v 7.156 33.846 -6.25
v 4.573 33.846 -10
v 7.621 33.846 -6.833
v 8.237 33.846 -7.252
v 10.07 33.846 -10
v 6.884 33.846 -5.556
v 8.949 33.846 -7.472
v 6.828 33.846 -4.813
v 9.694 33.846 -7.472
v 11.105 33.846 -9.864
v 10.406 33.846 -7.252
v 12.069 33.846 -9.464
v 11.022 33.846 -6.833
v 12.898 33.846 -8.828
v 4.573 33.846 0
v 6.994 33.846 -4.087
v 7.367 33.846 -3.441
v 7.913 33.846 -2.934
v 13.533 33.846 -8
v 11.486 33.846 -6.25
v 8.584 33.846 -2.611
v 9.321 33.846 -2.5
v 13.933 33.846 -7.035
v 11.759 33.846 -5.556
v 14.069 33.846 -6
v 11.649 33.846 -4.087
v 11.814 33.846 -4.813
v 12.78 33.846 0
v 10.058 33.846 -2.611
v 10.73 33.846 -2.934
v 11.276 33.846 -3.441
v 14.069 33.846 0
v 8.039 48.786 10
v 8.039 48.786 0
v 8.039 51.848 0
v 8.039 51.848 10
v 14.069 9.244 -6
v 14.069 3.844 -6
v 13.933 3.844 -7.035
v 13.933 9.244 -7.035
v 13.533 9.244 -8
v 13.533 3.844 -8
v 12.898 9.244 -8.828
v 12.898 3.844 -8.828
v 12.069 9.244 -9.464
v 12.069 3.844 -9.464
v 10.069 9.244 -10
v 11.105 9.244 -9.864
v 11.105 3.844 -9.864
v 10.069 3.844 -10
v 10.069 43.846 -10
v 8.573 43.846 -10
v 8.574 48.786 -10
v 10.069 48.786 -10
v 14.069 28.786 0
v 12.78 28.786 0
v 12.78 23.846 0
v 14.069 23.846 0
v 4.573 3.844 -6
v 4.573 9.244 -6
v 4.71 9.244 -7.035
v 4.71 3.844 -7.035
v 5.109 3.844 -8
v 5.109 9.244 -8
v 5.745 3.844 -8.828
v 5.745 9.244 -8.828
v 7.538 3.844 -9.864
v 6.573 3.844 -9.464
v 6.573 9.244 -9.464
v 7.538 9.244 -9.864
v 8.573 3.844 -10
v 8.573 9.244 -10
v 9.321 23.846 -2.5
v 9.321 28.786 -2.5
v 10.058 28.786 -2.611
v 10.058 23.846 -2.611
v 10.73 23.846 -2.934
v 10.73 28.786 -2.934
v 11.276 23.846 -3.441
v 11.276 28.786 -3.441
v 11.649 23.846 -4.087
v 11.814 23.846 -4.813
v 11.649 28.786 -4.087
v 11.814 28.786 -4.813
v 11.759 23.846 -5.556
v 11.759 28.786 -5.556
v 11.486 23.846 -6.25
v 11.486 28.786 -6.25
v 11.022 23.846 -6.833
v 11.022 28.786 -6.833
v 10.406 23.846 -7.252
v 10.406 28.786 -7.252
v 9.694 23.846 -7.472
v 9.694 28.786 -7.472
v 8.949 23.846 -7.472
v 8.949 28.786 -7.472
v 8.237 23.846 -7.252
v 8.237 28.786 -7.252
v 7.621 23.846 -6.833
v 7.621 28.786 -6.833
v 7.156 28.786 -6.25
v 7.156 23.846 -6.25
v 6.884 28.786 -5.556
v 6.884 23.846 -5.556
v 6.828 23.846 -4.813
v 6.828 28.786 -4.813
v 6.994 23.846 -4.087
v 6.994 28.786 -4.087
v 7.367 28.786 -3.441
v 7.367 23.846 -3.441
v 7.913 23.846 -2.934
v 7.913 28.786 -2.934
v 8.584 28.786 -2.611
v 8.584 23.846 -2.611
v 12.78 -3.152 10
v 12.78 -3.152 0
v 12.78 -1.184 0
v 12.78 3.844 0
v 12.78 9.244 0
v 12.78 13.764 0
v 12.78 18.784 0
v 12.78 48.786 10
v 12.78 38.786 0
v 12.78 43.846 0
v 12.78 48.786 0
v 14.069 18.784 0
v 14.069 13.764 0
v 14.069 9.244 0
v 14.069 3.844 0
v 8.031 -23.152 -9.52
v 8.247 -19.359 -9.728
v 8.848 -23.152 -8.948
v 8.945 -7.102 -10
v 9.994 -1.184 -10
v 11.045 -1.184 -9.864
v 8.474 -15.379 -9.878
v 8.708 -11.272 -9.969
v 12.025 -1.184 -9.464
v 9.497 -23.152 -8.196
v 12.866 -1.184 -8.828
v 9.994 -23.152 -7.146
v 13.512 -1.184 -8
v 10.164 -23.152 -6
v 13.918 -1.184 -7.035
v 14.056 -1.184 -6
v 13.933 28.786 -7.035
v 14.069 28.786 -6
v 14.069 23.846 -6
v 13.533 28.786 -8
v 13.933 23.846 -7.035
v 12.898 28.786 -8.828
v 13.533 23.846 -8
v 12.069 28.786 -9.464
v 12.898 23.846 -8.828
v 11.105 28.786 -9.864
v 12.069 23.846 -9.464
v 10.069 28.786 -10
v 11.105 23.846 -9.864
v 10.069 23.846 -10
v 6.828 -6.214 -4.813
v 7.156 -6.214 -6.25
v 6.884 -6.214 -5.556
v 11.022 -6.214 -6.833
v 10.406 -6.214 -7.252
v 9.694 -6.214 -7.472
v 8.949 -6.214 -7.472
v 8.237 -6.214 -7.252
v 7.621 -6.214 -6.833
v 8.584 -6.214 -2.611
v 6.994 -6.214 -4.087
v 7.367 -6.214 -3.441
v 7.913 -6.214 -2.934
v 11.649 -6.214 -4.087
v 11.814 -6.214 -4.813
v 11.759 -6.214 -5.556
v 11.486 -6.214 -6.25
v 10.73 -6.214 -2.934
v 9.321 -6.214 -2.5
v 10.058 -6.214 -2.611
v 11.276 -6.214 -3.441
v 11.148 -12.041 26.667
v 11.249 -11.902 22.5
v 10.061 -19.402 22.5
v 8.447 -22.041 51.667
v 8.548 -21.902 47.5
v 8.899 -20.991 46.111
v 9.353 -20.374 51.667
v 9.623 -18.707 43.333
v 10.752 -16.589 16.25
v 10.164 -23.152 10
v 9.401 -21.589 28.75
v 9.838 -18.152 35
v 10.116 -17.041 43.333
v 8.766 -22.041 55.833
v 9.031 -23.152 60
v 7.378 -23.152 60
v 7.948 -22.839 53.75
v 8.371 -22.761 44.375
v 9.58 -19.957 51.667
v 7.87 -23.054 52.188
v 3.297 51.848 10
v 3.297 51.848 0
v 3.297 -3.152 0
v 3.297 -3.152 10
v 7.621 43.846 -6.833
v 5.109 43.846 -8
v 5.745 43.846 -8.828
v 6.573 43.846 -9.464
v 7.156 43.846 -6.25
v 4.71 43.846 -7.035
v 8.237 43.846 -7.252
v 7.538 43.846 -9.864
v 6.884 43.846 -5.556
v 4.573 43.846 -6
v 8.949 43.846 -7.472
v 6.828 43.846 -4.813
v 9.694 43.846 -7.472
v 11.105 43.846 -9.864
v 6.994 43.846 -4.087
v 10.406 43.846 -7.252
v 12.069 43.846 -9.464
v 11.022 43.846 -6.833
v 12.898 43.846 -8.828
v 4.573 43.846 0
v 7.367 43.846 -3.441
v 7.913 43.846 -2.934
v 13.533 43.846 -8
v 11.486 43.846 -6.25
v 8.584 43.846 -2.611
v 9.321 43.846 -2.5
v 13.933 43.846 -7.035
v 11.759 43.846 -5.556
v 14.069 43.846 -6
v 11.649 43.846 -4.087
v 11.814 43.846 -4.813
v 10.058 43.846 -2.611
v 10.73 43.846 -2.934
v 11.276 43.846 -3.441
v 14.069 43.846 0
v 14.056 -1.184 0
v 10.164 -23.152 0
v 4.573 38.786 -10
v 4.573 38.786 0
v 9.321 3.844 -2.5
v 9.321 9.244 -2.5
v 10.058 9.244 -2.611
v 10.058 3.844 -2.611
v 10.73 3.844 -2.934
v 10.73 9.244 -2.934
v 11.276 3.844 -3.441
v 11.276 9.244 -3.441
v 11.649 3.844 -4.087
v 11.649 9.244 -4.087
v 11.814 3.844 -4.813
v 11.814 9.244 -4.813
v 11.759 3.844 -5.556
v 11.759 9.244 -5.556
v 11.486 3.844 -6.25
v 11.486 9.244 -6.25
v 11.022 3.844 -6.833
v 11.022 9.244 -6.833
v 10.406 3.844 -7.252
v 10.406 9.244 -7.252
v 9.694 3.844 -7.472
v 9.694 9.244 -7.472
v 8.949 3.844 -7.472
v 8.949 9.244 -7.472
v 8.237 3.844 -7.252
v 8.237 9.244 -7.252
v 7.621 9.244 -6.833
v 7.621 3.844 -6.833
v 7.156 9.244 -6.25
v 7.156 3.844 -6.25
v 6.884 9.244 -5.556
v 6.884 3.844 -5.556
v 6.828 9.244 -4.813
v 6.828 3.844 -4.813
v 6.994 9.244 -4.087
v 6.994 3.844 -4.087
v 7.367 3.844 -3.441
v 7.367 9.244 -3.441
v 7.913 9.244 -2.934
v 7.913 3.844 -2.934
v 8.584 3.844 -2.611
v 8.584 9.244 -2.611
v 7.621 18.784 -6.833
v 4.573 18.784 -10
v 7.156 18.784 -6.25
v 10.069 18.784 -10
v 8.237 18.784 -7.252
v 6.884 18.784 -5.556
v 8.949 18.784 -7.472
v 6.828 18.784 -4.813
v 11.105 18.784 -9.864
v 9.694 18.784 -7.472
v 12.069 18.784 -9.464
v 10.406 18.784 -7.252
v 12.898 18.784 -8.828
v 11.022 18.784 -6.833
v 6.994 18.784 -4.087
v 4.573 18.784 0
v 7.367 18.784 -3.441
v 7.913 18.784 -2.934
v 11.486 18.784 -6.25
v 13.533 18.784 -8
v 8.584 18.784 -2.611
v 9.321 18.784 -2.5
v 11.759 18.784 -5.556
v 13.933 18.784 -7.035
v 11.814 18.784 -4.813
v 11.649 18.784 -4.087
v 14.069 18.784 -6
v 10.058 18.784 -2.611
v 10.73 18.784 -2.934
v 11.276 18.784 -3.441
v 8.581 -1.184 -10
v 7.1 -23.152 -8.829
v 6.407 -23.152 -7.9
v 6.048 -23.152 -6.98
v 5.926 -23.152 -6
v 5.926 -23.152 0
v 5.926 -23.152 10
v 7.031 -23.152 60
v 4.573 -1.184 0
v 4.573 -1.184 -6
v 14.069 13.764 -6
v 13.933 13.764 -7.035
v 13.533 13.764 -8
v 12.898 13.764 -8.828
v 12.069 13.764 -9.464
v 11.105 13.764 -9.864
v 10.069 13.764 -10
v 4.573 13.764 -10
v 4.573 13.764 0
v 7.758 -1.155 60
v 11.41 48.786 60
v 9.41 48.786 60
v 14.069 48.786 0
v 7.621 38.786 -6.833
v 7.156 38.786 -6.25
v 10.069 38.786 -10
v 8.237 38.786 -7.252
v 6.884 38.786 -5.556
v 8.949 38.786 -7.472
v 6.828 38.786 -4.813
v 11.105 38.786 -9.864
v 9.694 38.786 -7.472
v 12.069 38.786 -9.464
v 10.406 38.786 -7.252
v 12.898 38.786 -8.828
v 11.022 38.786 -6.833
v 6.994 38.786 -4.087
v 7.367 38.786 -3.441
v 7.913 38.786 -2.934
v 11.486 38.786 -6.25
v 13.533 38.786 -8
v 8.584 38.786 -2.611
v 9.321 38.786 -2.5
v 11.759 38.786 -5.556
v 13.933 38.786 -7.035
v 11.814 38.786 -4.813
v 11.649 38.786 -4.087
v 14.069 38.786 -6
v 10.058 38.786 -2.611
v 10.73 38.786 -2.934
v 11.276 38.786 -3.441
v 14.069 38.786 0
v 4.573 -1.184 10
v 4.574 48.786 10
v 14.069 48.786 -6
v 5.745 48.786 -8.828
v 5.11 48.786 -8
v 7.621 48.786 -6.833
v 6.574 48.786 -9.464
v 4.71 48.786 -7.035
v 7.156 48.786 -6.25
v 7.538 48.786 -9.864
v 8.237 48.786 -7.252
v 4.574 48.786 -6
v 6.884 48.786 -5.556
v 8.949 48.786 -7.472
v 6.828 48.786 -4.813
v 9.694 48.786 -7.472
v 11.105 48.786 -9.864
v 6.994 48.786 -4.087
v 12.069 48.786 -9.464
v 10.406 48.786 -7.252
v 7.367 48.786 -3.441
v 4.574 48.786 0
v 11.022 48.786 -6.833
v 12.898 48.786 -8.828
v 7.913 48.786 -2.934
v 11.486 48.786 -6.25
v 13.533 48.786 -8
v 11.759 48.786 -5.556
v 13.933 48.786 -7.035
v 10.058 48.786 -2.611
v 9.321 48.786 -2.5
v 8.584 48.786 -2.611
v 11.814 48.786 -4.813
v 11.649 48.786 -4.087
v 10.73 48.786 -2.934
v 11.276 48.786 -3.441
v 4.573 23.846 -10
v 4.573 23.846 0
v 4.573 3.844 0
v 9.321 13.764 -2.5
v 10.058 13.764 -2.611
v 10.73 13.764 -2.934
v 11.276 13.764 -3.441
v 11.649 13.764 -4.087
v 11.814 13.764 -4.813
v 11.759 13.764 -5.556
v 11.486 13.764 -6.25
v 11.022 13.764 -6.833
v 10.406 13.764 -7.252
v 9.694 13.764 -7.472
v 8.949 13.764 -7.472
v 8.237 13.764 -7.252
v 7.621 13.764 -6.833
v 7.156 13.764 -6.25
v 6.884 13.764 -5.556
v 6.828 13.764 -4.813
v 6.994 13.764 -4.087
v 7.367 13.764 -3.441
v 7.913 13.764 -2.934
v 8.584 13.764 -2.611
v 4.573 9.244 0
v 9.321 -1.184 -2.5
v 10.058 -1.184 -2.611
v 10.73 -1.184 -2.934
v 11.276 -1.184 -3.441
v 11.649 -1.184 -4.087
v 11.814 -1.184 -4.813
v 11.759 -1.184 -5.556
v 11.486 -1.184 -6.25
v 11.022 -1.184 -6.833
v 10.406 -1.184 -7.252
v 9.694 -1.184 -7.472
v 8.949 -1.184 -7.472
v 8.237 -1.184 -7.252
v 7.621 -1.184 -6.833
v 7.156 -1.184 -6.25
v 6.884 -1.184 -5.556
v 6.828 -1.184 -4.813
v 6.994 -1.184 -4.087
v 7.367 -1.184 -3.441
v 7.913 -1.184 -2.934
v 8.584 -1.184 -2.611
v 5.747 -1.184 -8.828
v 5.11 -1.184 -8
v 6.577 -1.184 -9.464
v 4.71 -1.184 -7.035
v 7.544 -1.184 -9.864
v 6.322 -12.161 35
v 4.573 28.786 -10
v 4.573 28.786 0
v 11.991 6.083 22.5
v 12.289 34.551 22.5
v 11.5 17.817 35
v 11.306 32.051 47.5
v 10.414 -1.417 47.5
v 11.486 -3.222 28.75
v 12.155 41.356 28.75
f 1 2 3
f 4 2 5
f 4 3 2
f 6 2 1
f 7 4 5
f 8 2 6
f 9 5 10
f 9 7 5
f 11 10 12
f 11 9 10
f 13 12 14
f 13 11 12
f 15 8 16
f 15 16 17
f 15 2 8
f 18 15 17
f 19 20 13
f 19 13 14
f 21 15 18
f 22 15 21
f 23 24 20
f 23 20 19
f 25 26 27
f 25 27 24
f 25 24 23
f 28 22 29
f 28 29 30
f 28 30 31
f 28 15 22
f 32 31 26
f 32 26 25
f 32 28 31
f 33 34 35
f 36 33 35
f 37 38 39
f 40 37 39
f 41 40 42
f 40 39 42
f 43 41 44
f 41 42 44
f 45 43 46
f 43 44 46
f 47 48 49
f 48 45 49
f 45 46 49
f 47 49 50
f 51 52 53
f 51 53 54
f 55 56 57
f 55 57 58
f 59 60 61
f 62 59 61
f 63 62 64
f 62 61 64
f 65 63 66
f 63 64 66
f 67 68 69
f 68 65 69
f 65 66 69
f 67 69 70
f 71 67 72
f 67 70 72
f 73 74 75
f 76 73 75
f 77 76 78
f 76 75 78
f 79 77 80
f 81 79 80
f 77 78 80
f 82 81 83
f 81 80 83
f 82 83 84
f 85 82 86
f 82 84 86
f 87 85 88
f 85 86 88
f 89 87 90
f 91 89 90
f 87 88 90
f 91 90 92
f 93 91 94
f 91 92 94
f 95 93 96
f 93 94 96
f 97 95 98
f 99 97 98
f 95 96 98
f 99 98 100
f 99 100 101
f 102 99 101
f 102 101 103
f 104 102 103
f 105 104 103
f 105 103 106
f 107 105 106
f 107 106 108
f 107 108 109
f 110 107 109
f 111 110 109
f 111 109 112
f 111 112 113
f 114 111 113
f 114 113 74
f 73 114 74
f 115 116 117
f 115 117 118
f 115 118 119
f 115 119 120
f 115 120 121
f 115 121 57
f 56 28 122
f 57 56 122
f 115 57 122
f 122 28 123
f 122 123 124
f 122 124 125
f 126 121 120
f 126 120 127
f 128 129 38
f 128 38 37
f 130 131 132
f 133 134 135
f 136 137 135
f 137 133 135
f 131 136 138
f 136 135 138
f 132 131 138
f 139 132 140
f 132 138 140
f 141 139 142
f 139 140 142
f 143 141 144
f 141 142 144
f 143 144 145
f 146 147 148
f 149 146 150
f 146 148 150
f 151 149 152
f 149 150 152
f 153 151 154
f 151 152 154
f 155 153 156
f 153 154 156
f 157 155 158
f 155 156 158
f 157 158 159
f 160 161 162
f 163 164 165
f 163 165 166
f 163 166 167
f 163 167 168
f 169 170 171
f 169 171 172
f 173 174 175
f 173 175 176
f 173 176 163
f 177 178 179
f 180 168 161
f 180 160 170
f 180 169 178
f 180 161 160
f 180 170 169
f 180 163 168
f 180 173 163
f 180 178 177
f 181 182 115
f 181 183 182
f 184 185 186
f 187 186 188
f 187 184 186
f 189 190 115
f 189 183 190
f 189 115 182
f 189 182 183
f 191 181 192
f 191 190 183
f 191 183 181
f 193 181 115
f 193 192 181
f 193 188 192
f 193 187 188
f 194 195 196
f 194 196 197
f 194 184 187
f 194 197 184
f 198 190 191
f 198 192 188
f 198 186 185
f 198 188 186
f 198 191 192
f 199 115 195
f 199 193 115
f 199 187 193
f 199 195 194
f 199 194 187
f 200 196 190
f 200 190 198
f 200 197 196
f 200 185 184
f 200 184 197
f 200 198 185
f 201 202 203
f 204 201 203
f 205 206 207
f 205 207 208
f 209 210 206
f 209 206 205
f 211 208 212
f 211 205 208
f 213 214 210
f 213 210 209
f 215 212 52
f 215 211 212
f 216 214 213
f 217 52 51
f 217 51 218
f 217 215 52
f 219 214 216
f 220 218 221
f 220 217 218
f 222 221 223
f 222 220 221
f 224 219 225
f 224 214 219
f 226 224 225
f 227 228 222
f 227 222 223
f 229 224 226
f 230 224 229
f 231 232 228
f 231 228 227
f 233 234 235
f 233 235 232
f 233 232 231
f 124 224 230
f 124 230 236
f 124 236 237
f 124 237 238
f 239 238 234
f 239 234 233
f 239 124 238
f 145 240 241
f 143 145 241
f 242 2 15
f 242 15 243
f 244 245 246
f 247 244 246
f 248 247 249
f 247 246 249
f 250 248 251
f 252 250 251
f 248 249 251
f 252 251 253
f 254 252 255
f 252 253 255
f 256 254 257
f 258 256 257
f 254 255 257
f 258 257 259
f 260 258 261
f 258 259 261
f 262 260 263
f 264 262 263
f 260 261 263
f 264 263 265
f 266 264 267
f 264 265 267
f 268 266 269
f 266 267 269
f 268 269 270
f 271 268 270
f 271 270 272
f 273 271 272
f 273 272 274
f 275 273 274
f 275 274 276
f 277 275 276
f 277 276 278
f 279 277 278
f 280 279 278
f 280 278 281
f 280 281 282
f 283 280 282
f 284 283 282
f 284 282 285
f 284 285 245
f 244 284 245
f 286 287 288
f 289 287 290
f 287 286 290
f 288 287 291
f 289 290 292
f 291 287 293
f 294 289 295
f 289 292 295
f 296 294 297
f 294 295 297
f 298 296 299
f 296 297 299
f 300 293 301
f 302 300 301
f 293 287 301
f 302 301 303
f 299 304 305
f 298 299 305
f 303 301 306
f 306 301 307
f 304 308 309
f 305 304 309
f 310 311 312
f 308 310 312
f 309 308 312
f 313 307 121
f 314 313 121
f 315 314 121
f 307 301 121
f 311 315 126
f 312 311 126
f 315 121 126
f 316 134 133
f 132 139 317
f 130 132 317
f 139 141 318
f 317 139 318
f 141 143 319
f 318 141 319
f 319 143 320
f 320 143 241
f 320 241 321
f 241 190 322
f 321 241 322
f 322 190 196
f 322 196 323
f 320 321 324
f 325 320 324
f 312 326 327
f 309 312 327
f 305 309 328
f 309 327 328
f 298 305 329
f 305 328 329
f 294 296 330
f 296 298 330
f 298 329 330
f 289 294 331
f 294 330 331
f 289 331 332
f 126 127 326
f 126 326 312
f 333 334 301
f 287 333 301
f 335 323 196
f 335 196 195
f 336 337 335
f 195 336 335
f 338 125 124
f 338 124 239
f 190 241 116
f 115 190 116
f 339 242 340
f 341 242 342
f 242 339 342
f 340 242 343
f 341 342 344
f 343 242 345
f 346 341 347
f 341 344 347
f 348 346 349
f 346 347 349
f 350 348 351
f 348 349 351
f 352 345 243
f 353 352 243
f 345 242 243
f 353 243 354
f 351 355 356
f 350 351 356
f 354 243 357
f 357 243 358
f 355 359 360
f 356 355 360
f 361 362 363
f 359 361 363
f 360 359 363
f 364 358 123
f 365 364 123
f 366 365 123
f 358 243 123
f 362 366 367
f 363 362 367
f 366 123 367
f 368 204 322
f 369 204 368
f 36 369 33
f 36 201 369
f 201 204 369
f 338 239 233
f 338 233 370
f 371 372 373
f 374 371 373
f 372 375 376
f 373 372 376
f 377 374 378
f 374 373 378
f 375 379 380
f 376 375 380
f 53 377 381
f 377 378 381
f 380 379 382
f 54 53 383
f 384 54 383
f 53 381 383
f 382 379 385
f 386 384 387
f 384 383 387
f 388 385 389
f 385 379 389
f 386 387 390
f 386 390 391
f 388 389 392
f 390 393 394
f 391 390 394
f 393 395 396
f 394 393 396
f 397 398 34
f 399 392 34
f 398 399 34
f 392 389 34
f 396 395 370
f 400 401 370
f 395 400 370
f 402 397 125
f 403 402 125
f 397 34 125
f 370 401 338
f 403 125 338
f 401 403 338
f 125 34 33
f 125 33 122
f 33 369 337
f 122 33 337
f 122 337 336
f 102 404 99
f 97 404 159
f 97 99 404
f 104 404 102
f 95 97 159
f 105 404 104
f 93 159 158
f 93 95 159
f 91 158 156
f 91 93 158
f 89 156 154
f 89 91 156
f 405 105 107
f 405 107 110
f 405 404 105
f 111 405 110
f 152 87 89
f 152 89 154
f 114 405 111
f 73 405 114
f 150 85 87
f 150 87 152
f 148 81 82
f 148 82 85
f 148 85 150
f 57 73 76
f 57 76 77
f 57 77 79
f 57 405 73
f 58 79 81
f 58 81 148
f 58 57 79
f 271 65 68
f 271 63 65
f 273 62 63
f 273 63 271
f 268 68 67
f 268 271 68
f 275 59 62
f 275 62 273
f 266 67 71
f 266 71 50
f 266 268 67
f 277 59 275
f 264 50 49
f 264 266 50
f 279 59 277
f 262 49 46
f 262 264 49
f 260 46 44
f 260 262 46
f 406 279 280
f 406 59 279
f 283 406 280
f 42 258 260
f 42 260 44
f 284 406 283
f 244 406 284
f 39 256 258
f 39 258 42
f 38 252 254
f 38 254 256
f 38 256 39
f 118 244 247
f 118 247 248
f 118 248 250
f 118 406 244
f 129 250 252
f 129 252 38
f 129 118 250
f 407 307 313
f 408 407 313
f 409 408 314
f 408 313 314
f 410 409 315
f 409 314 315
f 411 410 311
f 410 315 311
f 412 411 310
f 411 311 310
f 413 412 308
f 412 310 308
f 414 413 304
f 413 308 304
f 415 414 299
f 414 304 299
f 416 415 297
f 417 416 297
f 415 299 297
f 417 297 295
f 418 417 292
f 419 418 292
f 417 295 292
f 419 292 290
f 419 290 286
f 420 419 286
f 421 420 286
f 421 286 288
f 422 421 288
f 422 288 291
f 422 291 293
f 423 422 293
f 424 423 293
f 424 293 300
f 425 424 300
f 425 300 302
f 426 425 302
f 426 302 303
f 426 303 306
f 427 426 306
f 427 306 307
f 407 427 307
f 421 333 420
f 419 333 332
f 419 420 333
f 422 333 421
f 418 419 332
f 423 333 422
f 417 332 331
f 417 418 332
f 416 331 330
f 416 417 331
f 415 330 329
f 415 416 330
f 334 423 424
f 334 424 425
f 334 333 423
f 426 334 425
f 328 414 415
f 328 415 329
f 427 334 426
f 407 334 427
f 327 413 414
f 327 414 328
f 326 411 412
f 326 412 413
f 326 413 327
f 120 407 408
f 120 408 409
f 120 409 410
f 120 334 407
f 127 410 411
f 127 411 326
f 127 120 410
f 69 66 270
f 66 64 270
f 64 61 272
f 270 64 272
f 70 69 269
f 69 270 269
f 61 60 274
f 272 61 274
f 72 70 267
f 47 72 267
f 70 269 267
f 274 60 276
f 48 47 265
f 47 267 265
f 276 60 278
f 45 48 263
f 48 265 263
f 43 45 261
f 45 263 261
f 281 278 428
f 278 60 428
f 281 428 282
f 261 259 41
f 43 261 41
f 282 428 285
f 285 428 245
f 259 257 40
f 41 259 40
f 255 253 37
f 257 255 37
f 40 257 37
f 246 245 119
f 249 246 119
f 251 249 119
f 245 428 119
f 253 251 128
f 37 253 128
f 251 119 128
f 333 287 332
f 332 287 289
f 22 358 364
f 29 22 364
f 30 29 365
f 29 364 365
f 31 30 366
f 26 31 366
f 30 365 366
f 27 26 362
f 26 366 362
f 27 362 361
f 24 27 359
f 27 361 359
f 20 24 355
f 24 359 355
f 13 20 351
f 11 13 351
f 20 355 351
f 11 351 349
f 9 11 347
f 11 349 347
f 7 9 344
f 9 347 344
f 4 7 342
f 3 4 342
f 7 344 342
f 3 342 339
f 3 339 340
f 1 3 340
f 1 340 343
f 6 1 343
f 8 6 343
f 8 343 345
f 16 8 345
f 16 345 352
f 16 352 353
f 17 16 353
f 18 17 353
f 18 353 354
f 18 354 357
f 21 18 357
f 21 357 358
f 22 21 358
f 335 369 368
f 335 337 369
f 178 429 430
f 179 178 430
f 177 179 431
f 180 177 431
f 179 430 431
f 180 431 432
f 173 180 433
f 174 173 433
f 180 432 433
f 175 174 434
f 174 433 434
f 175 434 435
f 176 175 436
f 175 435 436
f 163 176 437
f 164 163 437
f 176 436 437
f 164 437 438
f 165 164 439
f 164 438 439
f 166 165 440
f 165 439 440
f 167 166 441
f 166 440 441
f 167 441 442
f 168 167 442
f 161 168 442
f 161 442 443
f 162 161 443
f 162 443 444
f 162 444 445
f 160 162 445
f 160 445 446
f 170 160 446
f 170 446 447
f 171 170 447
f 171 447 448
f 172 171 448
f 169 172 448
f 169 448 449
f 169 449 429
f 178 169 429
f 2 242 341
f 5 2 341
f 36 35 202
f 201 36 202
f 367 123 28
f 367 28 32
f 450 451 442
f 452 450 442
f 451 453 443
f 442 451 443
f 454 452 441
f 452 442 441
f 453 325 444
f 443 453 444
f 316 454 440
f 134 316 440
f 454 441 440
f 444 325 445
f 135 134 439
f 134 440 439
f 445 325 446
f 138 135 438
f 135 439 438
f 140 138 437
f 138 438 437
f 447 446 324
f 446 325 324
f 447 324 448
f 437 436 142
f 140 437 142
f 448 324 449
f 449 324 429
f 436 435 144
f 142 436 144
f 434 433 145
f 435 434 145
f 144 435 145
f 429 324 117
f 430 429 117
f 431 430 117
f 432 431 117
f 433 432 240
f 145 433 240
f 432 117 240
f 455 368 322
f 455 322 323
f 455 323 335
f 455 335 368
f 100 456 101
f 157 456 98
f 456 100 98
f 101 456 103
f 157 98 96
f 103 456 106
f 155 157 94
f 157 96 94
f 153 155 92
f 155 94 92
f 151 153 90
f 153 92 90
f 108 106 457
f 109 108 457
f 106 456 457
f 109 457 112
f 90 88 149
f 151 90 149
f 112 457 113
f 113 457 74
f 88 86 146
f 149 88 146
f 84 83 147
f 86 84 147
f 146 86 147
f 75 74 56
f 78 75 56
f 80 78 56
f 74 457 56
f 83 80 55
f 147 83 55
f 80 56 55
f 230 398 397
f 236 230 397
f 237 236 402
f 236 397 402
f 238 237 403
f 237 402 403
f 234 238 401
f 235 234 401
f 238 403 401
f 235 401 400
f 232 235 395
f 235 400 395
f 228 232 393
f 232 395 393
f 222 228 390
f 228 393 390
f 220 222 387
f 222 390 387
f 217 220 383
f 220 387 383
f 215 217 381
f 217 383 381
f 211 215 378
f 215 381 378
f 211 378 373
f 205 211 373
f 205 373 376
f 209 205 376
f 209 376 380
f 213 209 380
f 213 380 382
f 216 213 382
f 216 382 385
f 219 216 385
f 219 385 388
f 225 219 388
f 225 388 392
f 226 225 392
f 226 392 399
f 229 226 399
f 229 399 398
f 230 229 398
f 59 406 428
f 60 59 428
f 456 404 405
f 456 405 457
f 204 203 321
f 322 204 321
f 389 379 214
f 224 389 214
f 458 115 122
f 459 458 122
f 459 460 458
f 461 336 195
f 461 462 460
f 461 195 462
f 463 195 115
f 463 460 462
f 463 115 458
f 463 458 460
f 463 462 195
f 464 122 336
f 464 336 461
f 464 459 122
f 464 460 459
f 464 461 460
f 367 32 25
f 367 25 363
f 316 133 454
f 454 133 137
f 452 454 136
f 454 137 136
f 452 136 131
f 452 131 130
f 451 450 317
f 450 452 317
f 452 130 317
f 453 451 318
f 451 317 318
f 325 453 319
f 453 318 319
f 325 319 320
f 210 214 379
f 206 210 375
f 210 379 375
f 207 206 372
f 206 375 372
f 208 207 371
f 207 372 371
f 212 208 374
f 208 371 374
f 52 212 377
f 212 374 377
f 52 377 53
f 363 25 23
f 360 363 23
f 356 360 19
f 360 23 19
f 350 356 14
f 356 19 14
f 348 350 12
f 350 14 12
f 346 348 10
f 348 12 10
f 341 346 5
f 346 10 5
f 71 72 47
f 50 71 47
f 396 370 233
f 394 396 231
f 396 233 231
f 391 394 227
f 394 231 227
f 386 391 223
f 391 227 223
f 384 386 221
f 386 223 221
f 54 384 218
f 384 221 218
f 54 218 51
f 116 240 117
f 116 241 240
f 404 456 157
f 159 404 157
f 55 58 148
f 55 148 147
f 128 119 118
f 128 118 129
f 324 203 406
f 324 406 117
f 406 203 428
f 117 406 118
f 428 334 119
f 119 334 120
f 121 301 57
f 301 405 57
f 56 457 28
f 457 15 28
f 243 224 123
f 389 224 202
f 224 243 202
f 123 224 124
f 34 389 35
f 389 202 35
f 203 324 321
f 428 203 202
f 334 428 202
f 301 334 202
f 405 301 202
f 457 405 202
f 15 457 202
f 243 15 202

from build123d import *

# Parameters (mm, degrees)
SKETCH1_W             = 9.495809557
SKETCH1_H             = 5.4
BOSS_EXTRUDE1_DEPTH   = 10
SKETCH1_H_2           = 5.02
BOSS_EXTRUDE1_2_DEPTH = 10
SKETCH1_H_3           = 4.94
BOSS_EXTRUDE1_3_DEPTH = 10
BOSS_EXTRUDE1_4_DEPTH = 10
BOSS_EXTRUDE1_5_DEPTH = 10
BOSS_EXTRUDE2_DEPTH   = 10
BOSS_EXTRUDE3_DEPTH   = 10
FILLET1_R             = 4
SKETCH6_R             = 2.5
CUT_EXTRUDE1_DEPTH    = 55


with BuildPart() as part:
    # Sketch1 → Boss-Extrude1 (new body)
    with BuildSketch(Plane.XY):
        with Locations((9.321382843, 6.543931341)):
            Rectangle(SKETCH1_W, SKETCH1_H)
    extrude(amount=-BOSS_EXTRUDE1_DEPTH)



with BuildPart() as body_2:
    # Sketch1 → Boss-Extrude1 2 (new body)
    with BuildSketch(Plane.XY):
        with Locations((9.321382843, 16.273802043)):
            Rectangle(SKETCH1_W, SKETCH1_H_2)
    extrude(amount=-BOSS_EXTRUDE1_2_DEPTH)


with BuildPart() as body_3:
    # Sketch1 → Boss-Extrude1 3 (new body)
    with BuildSketch(Plane.XY):
        with Locations((9.321382843, 26.315620999)):
            Rectangle(SKETCH1_W, SKETCH1_H_3)
    extrude(amount=-BOSS_EXTRUDE1_3_DEPTH)


with BuildPart() as body_4:
    # Sketch1 → Boss-Extrude1 4 (new body)
    with BuildSketch(Plane.XY):
        with Locations((9.321382843, 36.315620999)):
            Rectangle(SKETCH1_W, SKETCH1_H_3)
    extrude(amount=-BOSS_EXTRUDE1_4_DEPTH)


with BuildPart() as body_5:
    # Sketch1 → Boss-Extrude1 5 (new body)
    with BuildSketch(Plane.XY):
        Polygon((4.573645694, 48.785620997), (4.573479076, 43.845621), (14.069286609, 43.845621), (14.069119991, 48.785620997), align=None)
    extrude(amount=-BOSS_EXTRUDE1_5_DEPTH)


with BuildPart() as part_1:
    add(part.part)

    add(body_2.part)  # Boss-Extrude2 merges body 2

    add(body_3.part)  # Boss-Extrude2 merges body 3

    add(body_4.part)  # Boss-Extrude2 merges body 4

    add(body_5.part)  # Boss-Extrude2 merges body 5
    # Boss-Extrude2: read off the stored shape, not the designer's step
    # Boss-Extrude2 outline → Boss-Extrude2 (add)
    with BuildSketch(Plane.XY):
        Polygon((10.164012515, -23.151739204), (12.780095601, -3.151737932), (12.780095601, 48.785620997), (8.038968881, 48.785620997), (8.038703883, 51.848260515), (3.297312166, 51.848260515), (3.297312166, -3.151737932), (5.92637416, -23.151739204), align=None)
    extrude(amount=BOSS_EXTRUDE2_DEPTH)

    # Sketch3 → Boss-Extrude3 (add)
    with BuildSketch(Plane(origin=(0, 0, 0), x_dir=(-1, 0, 0), z_dir=(0, 0, -1))):
        Polygon((-4.573478064, -1.184377448), (-14.056261499, -1.184377448), (-10.164012515, -23.151739204), (-5.92637416, -23.151739204), align=None)
    extrude(amount=BOSS_EXTRUDE3_DEPTH)

    # Fillet1
    # the kernel refuses this fillet: 4 mm, written as the material it takes off along each edge
    with BuildSketch(Plane(origin=(15.800919998, 8.662254805, -10), x_dir=(0, 0, 1), z_dir=(-0.17446584987640118, -0.9846632252841095, 0))) as fillet1_piece_1:
        with BuildLine():
            CenterArc((FILLET1_R, FILLET1_R), FILLET1_R, 180, 90)
            Line((0, FILLET1_R), (0, 0))
            Line((0, 0), (FILLET1_R, 0))
        make_face()
    extrude(amount=42.309517805, mode=Mode.SUBTRACT)
    with BuildSketch(Plane(origin=(6.54107595, -33.132828409, -10), x_dir=(0, 0, 1), z_dir=(-0.06147017908550384, 0.9981089204506671, 0))) as fillet1_piece_2:
        with BuildLine():
            CenterArc((FILLET1_R, FILLET1_R), FILLET1_R, 180, 90)
            Line((0, FILLET1_R), (0, 0))
            Line((0, 0), (FILLET1_R, 0))
        make_face()
    extrude(amount=42.008982493, mode=Mode.SUBTRACT)
    with BuildSketch(Plane(origin=(4.573982978, 58.785620992, -10), x_dir=(0, 0, 1), z_dir=(-3.372835133255536e-05, -0.9999999994311992, 0))) as fillet1_piece_3_section:
        with BuildLine():
            CenterArc((FILLET1_R, -FILLET1_R), FILLET1_R, 90, 90)
            Line((0, -FILLET1_R), (0, 0))
            Line((0, 0), (FILLET1_R, 0))
        make_face()
    fillet1_piece_3 = extrude(amount=24.94, mode=Mode.PRIVATE)
    fillet1_piece_3 = split(fillet1_piece_3, bisect_by=Plane(origin=(4.573982978, 38.785620999, -10), z_dir=(0, 1, 0)), keep=Keep.TOP, mode=Mode.PRIVATE)
    add(fillet1_piece_3, mode=Mode.SUBTRACT)
    with BuildSketch(Plane(origin=(14.069623892, 33.845621006, -10), x_dir=(0, 0, 1), z_dir=(-3.372835144025149e-05, 0.9999999994311992, 0)), Plane(origin=(14.069287621, 23.845620999, -10), x_dir=(0, 0, 1), z_dir=(0, 1, 0)), Plane(origin=(14.069287621, 13.845620999, -10), x_dir=(0, 0, 1), z_dir=(0, 1, 0))) as fillet1_piece_4:
        with BuildLine():
            CenterArc((FILLET1_R, -FILLET1_R), FILLET1_R, 90, 90)
            Line((0, -FILLET1_R), (0, 0))
            Line((0, 0), (FILLET1_R, 0))
        make_face()
    extrude(amount=24.94, mode=Mode.SUBTRACT)
    with BuildSketch(Plane(origin=(14.069287621, 3.763802043, -10), x_dir=(0, 0, 1), z_dir=(0, 1, 0))) as fillet1_piece_5:
        with BuildLine():
            CenterArc((FILLET1_R, -FILLET1_R), FILLET1_R, 90, 90)
            Line((0, -FILLET1_R), (0, 0))
            Line((0, 0), (FILLET1_R, 0))
        make_face()
    extrude(amount=25.02, mode=Mode.SUBTRACT)
    with BuildSketch(Plane(origin=(14.069287621, -6.156068659, -10), x_dir=(-1, 0, 0), z_dir=(0, 1, 0))) as fillet1_piece_6:
        with BuildLine():
            CenterArc((FILLET1_R, FILLET1_R), FILLET1_R, 180, 90)
            Line((0, FILLET1_R), (0, 0))
            Line((0, 0), (FILLET1_R, 0))
        make_face()
    extrude(amount=25.4, mode=Mode.SUBTRACT)
    with BuildSketch(Plane(origin=(4.573478064, 19.243931341, -10), x_dir=(0, 0, 1), z_dir=(0, -1, 0))) as fillet1_piece_7_section:
        with BuildLine():
            CenterArc((FILLET1_R, -FILLET1_R), FILLET1_R, 90, 90)
            Line((0, -FILLET1_R), (0, 0))
            Line((0, 0), (FILLET1_R, 0))
        make_face()
    fillet1_piece_7 = extrude(amount=25.4, mode=Mode.PRIVATE)
    fillet1_piece_7 = split(fillet1_piece_7, bisect_by=Plane(origin=(4.573478064, 13.763802043, -10), z_dir=(0, -1, 0)), keep=Keep.TOP, mode=Mode.PRIVATE)
    add(fillet1_piece_7, mode=Mode.SUBTRACT)

    # Loft2: read off the stored shape, not the designer's step
    # Loft2: loft between two sections, ruled curve by curve
    loft2_from = [
        Edge.make_bspline([(12.780095601, -3.151737932, 10), (12.780095601, 5.504488557, 10), (12.780095601, 14.160715045, 10), (12.780095601, 31.473168021, 10), (12.780095601, 40.129394509, 10), (12.780095601, 48.785620997, 10)], [0, 0, 0, 0, 0.5, 0.5, 1, 1, 1, 1], 3),
        Edge.make_bspline([(4.573645694, 48.785620997, 10), (4.573617756, 40.457287923, 10), (4.573589817, 32.128954849, 10), (4.573533941, 15.472288701, 10), (4.573506003, 7.143955626, 10), (4.573478064, -1.184377448, 10)], [0, 0, 0, 0, 0.5, 0.5, 1, 1, 1, 1], 3),
        Edge.make_bspline([(4.573478064, -1.184377448, 10), (4.798960747, -4.845604407, 10), (5.024443429, -8.506831367, 10), (5.475408794, -15.829285285, 10), (5.700891477, -19.490512245, 10), (5.92637416, -23.151739204, 10)], [0, 0, 0, 0, 0.5, 0.5, 1, 1, 1, 1], 3),
        Edge.make_bspline([(10.164012515, -23.151739204, 10), (10.600026362, -19.818405659, 10), (11.03604021, -16.485072113, 10), (11.908067905, -9.818405022, 10), (12.344081753, -6.485071477, 10), (12.780095601, -3.151737932, 10)], [0, 0, 0, 0, 0.5, 0.5, 1, 1, 1, 1], 3),
        Edge.make_line((10.164012515, -23.151739204, 10), (5.92637416, -23.151739204, 10)),
        Edge.make_line((4.573645694, 48.785620997, 10), (12.780095601, 48.785620997, 10)),
    ]
    loft2_to = [
        Edge.make_bspline([(9.030825072, -23.151739204, 60), (9.427276266, -11.162179171, 60), (9.823727461, 0.827380863, 60), (10.616629851, 24.80650093, 60), (11.013081046, 36.796060964, 60), (11.409532241, 48.785620997, 60)], [0, 0, 0, 0, 0.5, 0.5, 1, 1, 1, 1], 3),
        Edge.make_bspline([(9.409532241, 48.785620997, 60), (9.13430376, 40.462103653, 60), (8.859075279, 32.138586309, 60), (8.308618317, 15.491551622, 60), (8.033389836, 7.168034278, 60), (7.758161355, -1.155483066, 60)], [0, 0, 0, 0, 0.5, 0.5, 1, 1, 1, 1], 3),
        Edge.make_bspline([(7.758161355, -1.155483066, 60), (7.636938641, -4.821525756, 60), (7.515715927, -8.487568446, 60), (7.273270499, -15.819653825, 60), (7.152047785, -19.485696515, 60), (7.030825072, -23.151739204, 60)], [0, 0, 0, 0, 0.5, 0.5, 1, 1, 1, 1], 3),
        Edge.make_bspline([(7.378058471, -23.151739204, 60), (7.653519571, -23.151739204, 60), (7.928980671, -23.151739204, 60), (8.479902871, -23.151739204, 60), (8.755363971, -23.151739204, 60), (9.030825072, -23.151739204, 60)], [0, 0, 0, 0, 0.5, 0.5, 1, 1, 1, 1], 3),
        Edge.make_line((7.378058471, -23.151739204, 60), (7.030825072, -23.151739204, 60)),
        Edge.make_line((9.409532241, 48.785620997, 60), (11.409532241, 48.785620997, 60)),
    ]
    loft2 = Solid(Shell([*[Face.make_surface_from_curves(loft2_from[k], loft2_to[k]) for k in range(6)], Face(Wire(loft2_from)), Face(Wire(loft2_to))]))
    add(loft2)

    # Sketch6 → Cut-Extrude1 (cut)
    with BuildSketch(Plane(origin=(0, 48.785620997, 0), x_dir=(1, 0, 0), z_dir=(0, 1, 0))):
        with Locations(Location((9.321382843, 5, 0), (0, 0, 270))):
            Circle(SKETCH6_R)
    extrude(amount=-CUT_EXTRUDE1_DEPTH, mode=Mode.SUBTRACT)


solid = part_1.part
